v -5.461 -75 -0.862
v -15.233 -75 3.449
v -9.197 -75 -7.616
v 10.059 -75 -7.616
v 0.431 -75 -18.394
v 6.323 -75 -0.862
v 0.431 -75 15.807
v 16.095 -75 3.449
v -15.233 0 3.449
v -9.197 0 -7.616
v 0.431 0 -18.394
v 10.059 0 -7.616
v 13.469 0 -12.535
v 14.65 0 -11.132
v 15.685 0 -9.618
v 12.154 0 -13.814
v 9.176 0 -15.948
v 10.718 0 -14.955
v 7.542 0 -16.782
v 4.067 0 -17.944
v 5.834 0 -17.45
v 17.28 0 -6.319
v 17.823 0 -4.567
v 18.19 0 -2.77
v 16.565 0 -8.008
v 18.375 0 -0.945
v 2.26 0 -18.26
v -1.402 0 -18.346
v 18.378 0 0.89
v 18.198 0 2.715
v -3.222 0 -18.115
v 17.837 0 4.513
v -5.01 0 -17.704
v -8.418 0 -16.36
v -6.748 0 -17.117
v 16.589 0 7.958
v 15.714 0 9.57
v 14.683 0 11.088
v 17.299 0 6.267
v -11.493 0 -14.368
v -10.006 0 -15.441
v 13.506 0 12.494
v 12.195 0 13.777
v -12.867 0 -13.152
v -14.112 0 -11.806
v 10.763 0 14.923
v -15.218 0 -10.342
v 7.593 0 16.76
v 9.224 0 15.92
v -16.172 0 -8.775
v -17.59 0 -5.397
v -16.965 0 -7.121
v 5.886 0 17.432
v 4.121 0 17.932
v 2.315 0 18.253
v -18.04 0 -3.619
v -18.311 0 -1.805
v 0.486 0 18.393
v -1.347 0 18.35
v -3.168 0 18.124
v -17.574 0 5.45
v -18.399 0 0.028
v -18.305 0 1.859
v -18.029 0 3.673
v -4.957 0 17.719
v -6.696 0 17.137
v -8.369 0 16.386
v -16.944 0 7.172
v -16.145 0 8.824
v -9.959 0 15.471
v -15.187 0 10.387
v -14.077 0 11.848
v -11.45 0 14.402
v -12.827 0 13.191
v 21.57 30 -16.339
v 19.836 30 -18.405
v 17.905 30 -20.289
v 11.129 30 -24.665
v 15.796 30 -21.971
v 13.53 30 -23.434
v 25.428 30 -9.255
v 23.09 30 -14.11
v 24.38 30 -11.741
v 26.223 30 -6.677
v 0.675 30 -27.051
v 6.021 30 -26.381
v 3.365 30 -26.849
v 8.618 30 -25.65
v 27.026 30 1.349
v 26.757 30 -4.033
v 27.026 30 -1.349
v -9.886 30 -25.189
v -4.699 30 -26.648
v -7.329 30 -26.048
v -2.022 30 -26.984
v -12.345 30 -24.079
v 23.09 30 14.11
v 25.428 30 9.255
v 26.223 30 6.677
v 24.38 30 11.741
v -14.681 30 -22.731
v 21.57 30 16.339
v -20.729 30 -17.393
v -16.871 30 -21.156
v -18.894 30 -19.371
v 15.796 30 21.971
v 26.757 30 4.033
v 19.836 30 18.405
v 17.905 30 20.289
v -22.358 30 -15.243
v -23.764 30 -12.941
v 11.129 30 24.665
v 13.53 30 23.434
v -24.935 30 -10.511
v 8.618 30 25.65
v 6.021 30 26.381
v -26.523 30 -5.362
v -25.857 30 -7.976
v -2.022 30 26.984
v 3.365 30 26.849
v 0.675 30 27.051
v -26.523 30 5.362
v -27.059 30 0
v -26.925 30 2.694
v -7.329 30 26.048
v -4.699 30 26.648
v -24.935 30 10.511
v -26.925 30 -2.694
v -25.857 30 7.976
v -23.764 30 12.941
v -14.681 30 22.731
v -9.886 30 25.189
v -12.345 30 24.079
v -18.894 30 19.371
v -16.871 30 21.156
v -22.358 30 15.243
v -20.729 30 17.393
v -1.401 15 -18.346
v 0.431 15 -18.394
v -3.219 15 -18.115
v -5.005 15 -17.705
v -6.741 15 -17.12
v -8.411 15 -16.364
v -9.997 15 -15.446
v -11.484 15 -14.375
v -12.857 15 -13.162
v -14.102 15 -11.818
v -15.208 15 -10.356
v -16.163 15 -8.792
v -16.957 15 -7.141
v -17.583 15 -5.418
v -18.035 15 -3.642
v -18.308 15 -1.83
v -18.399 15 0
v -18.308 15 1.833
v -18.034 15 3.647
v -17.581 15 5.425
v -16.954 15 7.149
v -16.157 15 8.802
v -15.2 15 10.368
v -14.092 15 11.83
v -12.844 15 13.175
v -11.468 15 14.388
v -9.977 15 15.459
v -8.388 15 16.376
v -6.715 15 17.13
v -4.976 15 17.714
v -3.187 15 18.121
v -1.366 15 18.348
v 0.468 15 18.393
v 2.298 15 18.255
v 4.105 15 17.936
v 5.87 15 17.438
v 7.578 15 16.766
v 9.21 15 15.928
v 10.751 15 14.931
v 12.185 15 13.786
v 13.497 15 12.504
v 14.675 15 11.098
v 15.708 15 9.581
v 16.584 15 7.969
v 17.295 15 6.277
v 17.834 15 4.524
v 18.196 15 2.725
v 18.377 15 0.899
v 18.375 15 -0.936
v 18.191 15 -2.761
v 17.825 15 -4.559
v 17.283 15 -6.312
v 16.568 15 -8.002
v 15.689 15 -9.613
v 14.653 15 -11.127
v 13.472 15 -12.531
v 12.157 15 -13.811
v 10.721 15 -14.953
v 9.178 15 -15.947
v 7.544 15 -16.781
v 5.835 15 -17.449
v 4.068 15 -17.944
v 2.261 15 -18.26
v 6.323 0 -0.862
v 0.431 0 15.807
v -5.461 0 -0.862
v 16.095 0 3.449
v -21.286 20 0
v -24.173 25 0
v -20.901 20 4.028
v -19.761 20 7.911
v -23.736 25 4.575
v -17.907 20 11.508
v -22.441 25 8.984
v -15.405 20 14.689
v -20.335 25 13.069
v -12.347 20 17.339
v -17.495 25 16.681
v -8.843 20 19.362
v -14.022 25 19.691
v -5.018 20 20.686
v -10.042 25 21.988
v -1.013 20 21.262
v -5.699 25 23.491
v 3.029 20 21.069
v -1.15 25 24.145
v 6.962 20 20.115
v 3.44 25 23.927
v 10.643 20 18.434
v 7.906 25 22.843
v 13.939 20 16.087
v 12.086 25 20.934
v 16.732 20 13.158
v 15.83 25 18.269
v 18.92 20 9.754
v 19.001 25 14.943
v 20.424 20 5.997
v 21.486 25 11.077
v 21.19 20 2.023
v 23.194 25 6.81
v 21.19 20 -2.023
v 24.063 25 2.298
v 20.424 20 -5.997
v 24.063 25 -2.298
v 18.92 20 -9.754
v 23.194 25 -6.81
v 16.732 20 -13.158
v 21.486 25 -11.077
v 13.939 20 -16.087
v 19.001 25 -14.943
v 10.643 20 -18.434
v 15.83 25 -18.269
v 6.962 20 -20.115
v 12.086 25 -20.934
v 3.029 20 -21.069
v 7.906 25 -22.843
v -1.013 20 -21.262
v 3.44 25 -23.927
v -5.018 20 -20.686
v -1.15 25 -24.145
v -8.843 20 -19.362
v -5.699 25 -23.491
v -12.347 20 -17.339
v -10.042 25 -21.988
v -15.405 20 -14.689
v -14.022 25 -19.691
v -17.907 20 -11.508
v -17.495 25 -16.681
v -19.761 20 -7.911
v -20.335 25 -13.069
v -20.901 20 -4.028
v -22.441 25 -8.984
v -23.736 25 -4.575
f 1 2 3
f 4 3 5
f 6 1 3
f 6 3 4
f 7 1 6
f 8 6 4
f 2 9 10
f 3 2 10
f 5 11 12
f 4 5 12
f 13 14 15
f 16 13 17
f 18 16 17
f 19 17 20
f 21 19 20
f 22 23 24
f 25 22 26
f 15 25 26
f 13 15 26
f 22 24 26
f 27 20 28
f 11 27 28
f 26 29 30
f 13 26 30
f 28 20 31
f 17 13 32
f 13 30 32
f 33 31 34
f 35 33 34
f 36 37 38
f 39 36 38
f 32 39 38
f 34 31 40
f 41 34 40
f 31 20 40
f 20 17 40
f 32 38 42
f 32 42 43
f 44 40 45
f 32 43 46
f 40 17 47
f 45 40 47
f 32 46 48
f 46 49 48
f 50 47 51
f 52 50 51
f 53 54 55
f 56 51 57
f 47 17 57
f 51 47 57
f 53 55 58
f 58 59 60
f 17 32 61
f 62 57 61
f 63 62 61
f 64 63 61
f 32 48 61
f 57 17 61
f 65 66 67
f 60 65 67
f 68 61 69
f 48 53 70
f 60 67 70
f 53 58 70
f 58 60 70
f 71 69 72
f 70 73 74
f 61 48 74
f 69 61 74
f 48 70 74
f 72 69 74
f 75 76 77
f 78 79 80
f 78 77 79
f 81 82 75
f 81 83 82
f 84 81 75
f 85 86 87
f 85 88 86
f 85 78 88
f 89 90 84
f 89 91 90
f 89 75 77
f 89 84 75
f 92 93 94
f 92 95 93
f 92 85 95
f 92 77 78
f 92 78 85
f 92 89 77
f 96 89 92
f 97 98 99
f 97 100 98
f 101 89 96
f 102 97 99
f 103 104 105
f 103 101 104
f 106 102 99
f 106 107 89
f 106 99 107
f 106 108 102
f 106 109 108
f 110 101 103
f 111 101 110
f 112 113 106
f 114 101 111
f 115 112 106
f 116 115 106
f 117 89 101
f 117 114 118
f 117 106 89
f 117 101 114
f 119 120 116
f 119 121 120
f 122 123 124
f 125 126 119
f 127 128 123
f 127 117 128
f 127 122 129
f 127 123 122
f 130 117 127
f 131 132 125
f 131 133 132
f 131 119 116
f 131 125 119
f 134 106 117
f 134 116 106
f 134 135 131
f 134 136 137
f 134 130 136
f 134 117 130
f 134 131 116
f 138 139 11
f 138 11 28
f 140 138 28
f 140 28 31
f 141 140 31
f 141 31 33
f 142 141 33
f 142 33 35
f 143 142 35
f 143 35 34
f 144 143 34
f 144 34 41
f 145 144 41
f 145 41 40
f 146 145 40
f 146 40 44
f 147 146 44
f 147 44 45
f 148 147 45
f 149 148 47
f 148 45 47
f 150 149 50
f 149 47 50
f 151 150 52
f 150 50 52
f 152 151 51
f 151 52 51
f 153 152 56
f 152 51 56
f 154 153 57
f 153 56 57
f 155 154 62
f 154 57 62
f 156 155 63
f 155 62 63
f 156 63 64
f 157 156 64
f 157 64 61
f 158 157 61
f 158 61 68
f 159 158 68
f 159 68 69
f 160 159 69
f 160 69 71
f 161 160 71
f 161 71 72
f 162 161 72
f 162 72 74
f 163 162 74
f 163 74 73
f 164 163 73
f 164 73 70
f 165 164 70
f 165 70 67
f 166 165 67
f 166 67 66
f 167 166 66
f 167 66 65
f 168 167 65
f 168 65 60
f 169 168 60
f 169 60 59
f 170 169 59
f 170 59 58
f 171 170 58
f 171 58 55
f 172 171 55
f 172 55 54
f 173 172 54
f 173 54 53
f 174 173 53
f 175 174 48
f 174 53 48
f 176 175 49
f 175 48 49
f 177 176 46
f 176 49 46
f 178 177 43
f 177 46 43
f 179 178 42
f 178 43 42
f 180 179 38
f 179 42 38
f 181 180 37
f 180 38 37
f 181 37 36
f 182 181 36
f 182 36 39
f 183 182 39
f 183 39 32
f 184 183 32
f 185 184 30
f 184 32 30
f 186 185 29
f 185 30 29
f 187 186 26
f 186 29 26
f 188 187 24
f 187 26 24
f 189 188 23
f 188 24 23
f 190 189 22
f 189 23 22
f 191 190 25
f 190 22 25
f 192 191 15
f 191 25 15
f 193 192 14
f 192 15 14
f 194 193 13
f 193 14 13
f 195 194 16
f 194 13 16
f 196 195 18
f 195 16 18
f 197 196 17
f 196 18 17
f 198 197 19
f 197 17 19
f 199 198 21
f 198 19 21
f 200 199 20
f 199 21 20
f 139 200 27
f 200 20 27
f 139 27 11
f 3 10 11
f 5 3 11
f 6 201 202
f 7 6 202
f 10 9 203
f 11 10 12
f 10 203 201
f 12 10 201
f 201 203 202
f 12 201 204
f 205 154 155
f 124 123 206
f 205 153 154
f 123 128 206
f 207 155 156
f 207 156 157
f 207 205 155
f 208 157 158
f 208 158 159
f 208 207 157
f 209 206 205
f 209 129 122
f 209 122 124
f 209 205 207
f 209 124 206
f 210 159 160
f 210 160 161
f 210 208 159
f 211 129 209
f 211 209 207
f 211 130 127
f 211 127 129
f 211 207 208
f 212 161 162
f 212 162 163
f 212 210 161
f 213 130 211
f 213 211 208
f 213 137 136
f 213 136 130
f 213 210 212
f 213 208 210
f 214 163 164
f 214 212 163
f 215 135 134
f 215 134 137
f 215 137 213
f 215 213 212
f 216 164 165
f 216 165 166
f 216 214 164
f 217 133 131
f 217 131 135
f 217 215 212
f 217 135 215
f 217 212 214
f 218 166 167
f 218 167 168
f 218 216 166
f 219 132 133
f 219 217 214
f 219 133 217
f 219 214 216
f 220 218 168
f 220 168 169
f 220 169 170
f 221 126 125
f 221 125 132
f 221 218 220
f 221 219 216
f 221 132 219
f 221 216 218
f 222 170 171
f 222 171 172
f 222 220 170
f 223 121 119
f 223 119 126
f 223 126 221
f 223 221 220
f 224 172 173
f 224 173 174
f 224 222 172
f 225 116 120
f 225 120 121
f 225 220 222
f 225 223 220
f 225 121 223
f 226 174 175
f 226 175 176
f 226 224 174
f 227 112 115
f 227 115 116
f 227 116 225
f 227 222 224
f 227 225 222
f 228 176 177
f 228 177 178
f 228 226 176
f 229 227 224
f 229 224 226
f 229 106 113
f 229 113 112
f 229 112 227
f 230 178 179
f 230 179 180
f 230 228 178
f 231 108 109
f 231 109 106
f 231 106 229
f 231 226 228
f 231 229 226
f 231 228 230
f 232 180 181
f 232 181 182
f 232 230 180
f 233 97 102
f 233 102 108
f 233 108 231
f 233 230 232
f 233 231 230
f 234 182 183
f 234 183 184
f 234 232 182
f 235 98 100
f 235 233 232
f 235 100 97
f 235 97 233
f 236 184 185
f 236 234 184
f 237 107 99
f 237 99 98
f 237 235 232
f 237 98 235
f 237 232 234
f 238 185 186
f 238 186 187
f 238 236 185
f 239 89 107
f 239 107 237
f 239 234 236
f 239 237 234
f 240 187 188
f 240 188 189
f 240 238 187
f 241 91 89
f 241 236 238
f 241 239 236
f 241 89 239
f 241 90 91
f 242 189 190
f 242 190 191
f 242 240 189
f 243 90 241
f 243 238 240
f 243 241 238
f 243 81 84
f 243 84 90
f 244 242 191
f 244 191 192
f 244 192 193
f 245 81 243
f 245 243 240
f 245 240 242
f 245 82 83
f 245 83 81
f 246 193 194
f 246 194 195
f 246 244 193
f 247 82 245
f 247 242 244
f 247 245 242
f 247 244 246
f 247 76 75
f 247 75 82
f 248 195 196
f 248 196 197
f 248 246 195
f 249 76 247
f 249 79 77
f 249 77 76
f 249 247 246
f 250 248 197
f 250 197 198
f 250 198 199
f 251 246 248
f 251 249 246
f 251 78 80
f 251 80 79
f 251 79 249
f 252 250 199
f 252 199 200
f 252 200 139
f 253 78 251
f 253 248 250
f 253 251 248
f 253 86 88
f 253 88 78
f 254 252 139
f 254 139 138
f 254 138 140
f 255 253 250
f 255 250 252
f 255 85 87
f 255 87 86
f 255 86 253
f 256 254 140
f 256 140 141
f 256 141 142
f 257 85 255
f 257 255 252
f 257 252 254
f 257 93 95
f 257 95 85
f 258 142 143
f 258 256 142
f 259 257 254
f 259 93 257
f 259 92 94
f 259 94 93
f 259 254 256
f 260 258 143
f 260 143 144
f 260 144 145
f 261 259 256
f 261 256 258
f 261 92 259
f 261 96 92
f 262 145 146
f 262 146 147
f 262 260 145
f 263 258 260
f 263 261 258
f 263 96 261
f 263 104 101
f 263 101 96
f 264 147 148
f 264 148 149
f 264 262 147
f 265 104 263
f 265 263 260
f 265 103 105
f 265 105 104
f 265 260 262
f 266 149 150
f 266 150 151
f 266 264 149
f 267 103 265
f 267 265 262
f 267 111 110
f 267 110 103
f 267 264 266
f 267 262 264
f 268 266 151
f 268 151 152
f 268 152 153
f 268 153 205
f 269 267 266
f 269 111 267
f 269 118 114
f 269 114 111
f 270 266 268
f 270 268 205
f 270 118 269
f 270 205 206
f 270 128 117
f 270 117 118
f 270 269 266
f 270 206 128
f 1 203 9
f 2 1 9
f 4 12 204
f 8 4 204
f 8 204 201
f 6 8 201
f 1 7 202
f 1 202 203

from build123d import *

# Parameters (mm, degrees)
F1_DEPTH  = 75
F3_DEPTH  = 15
F3_FACE_R = 18.3992120147
F4_DEPTH  = 15
F4_TAPER  = -30


with BuildPart() as f1:
    # F0 (on Front) → F1 (new body)
    with BuildSketch(Plane.XZ):
        Polygon((-15.2326680545, 3.4489048412), (-9.1970840294, -7.6163323829), (0.4311103548, -18.3941606665), (10.0593047391, -7.6163323829), (16.0948887642, 3.4489048412), (6.3229899097, -0.8622264722), (0.4311103548, 15.8074827632), (-5.4607692, -0.8622264722), align=None)
    extrude(amount=F1_DEPTH)


with BuildPart() as f3:
    # F2 (on face) → F3 (new body)
    with BuildSketch(Plane(origin=(0, 0, 0), x_dir=(-1, 0, 0), z_dir=(0, 1, 0))):
        with BuildLine():
            ThreePointArc((-0.4311103548, -18.3941606665), (12.8568836026, -13.161745583), (18.3992120147, 0))
            ThreePointArc((18.3992120147, 0), (-12.8568836026, 13.161745583), (-0.4311103548, -18.3941606665))
        make_face()
        Polygon((9.1970840294, -7.6163323829), (-0.4311103548, -18.3941606665), (-10.0593047391, -7.6163323829), (-16.0948887642, 3.4489048412), (-6.3229899097, -0.8622264722), (-0.4311103548, 15.8074827632), (5.4607692, -0.8622264722), (15.2326680545, 3.4489048412), align=None, mode=Mode.SUBTRACT)
        Polygon((-10.0593047391, -7.6163323829), (-0.4311103548, -18.3941606665), (9.1970840294, -7.6163323829), (15.2326680545, 3.4489048412), (5.4607692, -0.8622264722), (-0.4311103548, 15.8074827632), (-6.3229899097, -0.8622264722), (-16.0948887642, 3.4489048412), align=None)
    extrude(amount=F3_DEPTH)

    # F3_face (on face) → F4 (join)
    with BuildSketch(Plane(origin=(0, 15, 0), x_dir=(-1, 0, 0), z_dir=(0, 1, 0))):
        Circle(F3_FACE_R)
    extrude(amount=F4_DEPTH, taper=F4_TAPER)


solid = Compound([f1.part, f3.part])
